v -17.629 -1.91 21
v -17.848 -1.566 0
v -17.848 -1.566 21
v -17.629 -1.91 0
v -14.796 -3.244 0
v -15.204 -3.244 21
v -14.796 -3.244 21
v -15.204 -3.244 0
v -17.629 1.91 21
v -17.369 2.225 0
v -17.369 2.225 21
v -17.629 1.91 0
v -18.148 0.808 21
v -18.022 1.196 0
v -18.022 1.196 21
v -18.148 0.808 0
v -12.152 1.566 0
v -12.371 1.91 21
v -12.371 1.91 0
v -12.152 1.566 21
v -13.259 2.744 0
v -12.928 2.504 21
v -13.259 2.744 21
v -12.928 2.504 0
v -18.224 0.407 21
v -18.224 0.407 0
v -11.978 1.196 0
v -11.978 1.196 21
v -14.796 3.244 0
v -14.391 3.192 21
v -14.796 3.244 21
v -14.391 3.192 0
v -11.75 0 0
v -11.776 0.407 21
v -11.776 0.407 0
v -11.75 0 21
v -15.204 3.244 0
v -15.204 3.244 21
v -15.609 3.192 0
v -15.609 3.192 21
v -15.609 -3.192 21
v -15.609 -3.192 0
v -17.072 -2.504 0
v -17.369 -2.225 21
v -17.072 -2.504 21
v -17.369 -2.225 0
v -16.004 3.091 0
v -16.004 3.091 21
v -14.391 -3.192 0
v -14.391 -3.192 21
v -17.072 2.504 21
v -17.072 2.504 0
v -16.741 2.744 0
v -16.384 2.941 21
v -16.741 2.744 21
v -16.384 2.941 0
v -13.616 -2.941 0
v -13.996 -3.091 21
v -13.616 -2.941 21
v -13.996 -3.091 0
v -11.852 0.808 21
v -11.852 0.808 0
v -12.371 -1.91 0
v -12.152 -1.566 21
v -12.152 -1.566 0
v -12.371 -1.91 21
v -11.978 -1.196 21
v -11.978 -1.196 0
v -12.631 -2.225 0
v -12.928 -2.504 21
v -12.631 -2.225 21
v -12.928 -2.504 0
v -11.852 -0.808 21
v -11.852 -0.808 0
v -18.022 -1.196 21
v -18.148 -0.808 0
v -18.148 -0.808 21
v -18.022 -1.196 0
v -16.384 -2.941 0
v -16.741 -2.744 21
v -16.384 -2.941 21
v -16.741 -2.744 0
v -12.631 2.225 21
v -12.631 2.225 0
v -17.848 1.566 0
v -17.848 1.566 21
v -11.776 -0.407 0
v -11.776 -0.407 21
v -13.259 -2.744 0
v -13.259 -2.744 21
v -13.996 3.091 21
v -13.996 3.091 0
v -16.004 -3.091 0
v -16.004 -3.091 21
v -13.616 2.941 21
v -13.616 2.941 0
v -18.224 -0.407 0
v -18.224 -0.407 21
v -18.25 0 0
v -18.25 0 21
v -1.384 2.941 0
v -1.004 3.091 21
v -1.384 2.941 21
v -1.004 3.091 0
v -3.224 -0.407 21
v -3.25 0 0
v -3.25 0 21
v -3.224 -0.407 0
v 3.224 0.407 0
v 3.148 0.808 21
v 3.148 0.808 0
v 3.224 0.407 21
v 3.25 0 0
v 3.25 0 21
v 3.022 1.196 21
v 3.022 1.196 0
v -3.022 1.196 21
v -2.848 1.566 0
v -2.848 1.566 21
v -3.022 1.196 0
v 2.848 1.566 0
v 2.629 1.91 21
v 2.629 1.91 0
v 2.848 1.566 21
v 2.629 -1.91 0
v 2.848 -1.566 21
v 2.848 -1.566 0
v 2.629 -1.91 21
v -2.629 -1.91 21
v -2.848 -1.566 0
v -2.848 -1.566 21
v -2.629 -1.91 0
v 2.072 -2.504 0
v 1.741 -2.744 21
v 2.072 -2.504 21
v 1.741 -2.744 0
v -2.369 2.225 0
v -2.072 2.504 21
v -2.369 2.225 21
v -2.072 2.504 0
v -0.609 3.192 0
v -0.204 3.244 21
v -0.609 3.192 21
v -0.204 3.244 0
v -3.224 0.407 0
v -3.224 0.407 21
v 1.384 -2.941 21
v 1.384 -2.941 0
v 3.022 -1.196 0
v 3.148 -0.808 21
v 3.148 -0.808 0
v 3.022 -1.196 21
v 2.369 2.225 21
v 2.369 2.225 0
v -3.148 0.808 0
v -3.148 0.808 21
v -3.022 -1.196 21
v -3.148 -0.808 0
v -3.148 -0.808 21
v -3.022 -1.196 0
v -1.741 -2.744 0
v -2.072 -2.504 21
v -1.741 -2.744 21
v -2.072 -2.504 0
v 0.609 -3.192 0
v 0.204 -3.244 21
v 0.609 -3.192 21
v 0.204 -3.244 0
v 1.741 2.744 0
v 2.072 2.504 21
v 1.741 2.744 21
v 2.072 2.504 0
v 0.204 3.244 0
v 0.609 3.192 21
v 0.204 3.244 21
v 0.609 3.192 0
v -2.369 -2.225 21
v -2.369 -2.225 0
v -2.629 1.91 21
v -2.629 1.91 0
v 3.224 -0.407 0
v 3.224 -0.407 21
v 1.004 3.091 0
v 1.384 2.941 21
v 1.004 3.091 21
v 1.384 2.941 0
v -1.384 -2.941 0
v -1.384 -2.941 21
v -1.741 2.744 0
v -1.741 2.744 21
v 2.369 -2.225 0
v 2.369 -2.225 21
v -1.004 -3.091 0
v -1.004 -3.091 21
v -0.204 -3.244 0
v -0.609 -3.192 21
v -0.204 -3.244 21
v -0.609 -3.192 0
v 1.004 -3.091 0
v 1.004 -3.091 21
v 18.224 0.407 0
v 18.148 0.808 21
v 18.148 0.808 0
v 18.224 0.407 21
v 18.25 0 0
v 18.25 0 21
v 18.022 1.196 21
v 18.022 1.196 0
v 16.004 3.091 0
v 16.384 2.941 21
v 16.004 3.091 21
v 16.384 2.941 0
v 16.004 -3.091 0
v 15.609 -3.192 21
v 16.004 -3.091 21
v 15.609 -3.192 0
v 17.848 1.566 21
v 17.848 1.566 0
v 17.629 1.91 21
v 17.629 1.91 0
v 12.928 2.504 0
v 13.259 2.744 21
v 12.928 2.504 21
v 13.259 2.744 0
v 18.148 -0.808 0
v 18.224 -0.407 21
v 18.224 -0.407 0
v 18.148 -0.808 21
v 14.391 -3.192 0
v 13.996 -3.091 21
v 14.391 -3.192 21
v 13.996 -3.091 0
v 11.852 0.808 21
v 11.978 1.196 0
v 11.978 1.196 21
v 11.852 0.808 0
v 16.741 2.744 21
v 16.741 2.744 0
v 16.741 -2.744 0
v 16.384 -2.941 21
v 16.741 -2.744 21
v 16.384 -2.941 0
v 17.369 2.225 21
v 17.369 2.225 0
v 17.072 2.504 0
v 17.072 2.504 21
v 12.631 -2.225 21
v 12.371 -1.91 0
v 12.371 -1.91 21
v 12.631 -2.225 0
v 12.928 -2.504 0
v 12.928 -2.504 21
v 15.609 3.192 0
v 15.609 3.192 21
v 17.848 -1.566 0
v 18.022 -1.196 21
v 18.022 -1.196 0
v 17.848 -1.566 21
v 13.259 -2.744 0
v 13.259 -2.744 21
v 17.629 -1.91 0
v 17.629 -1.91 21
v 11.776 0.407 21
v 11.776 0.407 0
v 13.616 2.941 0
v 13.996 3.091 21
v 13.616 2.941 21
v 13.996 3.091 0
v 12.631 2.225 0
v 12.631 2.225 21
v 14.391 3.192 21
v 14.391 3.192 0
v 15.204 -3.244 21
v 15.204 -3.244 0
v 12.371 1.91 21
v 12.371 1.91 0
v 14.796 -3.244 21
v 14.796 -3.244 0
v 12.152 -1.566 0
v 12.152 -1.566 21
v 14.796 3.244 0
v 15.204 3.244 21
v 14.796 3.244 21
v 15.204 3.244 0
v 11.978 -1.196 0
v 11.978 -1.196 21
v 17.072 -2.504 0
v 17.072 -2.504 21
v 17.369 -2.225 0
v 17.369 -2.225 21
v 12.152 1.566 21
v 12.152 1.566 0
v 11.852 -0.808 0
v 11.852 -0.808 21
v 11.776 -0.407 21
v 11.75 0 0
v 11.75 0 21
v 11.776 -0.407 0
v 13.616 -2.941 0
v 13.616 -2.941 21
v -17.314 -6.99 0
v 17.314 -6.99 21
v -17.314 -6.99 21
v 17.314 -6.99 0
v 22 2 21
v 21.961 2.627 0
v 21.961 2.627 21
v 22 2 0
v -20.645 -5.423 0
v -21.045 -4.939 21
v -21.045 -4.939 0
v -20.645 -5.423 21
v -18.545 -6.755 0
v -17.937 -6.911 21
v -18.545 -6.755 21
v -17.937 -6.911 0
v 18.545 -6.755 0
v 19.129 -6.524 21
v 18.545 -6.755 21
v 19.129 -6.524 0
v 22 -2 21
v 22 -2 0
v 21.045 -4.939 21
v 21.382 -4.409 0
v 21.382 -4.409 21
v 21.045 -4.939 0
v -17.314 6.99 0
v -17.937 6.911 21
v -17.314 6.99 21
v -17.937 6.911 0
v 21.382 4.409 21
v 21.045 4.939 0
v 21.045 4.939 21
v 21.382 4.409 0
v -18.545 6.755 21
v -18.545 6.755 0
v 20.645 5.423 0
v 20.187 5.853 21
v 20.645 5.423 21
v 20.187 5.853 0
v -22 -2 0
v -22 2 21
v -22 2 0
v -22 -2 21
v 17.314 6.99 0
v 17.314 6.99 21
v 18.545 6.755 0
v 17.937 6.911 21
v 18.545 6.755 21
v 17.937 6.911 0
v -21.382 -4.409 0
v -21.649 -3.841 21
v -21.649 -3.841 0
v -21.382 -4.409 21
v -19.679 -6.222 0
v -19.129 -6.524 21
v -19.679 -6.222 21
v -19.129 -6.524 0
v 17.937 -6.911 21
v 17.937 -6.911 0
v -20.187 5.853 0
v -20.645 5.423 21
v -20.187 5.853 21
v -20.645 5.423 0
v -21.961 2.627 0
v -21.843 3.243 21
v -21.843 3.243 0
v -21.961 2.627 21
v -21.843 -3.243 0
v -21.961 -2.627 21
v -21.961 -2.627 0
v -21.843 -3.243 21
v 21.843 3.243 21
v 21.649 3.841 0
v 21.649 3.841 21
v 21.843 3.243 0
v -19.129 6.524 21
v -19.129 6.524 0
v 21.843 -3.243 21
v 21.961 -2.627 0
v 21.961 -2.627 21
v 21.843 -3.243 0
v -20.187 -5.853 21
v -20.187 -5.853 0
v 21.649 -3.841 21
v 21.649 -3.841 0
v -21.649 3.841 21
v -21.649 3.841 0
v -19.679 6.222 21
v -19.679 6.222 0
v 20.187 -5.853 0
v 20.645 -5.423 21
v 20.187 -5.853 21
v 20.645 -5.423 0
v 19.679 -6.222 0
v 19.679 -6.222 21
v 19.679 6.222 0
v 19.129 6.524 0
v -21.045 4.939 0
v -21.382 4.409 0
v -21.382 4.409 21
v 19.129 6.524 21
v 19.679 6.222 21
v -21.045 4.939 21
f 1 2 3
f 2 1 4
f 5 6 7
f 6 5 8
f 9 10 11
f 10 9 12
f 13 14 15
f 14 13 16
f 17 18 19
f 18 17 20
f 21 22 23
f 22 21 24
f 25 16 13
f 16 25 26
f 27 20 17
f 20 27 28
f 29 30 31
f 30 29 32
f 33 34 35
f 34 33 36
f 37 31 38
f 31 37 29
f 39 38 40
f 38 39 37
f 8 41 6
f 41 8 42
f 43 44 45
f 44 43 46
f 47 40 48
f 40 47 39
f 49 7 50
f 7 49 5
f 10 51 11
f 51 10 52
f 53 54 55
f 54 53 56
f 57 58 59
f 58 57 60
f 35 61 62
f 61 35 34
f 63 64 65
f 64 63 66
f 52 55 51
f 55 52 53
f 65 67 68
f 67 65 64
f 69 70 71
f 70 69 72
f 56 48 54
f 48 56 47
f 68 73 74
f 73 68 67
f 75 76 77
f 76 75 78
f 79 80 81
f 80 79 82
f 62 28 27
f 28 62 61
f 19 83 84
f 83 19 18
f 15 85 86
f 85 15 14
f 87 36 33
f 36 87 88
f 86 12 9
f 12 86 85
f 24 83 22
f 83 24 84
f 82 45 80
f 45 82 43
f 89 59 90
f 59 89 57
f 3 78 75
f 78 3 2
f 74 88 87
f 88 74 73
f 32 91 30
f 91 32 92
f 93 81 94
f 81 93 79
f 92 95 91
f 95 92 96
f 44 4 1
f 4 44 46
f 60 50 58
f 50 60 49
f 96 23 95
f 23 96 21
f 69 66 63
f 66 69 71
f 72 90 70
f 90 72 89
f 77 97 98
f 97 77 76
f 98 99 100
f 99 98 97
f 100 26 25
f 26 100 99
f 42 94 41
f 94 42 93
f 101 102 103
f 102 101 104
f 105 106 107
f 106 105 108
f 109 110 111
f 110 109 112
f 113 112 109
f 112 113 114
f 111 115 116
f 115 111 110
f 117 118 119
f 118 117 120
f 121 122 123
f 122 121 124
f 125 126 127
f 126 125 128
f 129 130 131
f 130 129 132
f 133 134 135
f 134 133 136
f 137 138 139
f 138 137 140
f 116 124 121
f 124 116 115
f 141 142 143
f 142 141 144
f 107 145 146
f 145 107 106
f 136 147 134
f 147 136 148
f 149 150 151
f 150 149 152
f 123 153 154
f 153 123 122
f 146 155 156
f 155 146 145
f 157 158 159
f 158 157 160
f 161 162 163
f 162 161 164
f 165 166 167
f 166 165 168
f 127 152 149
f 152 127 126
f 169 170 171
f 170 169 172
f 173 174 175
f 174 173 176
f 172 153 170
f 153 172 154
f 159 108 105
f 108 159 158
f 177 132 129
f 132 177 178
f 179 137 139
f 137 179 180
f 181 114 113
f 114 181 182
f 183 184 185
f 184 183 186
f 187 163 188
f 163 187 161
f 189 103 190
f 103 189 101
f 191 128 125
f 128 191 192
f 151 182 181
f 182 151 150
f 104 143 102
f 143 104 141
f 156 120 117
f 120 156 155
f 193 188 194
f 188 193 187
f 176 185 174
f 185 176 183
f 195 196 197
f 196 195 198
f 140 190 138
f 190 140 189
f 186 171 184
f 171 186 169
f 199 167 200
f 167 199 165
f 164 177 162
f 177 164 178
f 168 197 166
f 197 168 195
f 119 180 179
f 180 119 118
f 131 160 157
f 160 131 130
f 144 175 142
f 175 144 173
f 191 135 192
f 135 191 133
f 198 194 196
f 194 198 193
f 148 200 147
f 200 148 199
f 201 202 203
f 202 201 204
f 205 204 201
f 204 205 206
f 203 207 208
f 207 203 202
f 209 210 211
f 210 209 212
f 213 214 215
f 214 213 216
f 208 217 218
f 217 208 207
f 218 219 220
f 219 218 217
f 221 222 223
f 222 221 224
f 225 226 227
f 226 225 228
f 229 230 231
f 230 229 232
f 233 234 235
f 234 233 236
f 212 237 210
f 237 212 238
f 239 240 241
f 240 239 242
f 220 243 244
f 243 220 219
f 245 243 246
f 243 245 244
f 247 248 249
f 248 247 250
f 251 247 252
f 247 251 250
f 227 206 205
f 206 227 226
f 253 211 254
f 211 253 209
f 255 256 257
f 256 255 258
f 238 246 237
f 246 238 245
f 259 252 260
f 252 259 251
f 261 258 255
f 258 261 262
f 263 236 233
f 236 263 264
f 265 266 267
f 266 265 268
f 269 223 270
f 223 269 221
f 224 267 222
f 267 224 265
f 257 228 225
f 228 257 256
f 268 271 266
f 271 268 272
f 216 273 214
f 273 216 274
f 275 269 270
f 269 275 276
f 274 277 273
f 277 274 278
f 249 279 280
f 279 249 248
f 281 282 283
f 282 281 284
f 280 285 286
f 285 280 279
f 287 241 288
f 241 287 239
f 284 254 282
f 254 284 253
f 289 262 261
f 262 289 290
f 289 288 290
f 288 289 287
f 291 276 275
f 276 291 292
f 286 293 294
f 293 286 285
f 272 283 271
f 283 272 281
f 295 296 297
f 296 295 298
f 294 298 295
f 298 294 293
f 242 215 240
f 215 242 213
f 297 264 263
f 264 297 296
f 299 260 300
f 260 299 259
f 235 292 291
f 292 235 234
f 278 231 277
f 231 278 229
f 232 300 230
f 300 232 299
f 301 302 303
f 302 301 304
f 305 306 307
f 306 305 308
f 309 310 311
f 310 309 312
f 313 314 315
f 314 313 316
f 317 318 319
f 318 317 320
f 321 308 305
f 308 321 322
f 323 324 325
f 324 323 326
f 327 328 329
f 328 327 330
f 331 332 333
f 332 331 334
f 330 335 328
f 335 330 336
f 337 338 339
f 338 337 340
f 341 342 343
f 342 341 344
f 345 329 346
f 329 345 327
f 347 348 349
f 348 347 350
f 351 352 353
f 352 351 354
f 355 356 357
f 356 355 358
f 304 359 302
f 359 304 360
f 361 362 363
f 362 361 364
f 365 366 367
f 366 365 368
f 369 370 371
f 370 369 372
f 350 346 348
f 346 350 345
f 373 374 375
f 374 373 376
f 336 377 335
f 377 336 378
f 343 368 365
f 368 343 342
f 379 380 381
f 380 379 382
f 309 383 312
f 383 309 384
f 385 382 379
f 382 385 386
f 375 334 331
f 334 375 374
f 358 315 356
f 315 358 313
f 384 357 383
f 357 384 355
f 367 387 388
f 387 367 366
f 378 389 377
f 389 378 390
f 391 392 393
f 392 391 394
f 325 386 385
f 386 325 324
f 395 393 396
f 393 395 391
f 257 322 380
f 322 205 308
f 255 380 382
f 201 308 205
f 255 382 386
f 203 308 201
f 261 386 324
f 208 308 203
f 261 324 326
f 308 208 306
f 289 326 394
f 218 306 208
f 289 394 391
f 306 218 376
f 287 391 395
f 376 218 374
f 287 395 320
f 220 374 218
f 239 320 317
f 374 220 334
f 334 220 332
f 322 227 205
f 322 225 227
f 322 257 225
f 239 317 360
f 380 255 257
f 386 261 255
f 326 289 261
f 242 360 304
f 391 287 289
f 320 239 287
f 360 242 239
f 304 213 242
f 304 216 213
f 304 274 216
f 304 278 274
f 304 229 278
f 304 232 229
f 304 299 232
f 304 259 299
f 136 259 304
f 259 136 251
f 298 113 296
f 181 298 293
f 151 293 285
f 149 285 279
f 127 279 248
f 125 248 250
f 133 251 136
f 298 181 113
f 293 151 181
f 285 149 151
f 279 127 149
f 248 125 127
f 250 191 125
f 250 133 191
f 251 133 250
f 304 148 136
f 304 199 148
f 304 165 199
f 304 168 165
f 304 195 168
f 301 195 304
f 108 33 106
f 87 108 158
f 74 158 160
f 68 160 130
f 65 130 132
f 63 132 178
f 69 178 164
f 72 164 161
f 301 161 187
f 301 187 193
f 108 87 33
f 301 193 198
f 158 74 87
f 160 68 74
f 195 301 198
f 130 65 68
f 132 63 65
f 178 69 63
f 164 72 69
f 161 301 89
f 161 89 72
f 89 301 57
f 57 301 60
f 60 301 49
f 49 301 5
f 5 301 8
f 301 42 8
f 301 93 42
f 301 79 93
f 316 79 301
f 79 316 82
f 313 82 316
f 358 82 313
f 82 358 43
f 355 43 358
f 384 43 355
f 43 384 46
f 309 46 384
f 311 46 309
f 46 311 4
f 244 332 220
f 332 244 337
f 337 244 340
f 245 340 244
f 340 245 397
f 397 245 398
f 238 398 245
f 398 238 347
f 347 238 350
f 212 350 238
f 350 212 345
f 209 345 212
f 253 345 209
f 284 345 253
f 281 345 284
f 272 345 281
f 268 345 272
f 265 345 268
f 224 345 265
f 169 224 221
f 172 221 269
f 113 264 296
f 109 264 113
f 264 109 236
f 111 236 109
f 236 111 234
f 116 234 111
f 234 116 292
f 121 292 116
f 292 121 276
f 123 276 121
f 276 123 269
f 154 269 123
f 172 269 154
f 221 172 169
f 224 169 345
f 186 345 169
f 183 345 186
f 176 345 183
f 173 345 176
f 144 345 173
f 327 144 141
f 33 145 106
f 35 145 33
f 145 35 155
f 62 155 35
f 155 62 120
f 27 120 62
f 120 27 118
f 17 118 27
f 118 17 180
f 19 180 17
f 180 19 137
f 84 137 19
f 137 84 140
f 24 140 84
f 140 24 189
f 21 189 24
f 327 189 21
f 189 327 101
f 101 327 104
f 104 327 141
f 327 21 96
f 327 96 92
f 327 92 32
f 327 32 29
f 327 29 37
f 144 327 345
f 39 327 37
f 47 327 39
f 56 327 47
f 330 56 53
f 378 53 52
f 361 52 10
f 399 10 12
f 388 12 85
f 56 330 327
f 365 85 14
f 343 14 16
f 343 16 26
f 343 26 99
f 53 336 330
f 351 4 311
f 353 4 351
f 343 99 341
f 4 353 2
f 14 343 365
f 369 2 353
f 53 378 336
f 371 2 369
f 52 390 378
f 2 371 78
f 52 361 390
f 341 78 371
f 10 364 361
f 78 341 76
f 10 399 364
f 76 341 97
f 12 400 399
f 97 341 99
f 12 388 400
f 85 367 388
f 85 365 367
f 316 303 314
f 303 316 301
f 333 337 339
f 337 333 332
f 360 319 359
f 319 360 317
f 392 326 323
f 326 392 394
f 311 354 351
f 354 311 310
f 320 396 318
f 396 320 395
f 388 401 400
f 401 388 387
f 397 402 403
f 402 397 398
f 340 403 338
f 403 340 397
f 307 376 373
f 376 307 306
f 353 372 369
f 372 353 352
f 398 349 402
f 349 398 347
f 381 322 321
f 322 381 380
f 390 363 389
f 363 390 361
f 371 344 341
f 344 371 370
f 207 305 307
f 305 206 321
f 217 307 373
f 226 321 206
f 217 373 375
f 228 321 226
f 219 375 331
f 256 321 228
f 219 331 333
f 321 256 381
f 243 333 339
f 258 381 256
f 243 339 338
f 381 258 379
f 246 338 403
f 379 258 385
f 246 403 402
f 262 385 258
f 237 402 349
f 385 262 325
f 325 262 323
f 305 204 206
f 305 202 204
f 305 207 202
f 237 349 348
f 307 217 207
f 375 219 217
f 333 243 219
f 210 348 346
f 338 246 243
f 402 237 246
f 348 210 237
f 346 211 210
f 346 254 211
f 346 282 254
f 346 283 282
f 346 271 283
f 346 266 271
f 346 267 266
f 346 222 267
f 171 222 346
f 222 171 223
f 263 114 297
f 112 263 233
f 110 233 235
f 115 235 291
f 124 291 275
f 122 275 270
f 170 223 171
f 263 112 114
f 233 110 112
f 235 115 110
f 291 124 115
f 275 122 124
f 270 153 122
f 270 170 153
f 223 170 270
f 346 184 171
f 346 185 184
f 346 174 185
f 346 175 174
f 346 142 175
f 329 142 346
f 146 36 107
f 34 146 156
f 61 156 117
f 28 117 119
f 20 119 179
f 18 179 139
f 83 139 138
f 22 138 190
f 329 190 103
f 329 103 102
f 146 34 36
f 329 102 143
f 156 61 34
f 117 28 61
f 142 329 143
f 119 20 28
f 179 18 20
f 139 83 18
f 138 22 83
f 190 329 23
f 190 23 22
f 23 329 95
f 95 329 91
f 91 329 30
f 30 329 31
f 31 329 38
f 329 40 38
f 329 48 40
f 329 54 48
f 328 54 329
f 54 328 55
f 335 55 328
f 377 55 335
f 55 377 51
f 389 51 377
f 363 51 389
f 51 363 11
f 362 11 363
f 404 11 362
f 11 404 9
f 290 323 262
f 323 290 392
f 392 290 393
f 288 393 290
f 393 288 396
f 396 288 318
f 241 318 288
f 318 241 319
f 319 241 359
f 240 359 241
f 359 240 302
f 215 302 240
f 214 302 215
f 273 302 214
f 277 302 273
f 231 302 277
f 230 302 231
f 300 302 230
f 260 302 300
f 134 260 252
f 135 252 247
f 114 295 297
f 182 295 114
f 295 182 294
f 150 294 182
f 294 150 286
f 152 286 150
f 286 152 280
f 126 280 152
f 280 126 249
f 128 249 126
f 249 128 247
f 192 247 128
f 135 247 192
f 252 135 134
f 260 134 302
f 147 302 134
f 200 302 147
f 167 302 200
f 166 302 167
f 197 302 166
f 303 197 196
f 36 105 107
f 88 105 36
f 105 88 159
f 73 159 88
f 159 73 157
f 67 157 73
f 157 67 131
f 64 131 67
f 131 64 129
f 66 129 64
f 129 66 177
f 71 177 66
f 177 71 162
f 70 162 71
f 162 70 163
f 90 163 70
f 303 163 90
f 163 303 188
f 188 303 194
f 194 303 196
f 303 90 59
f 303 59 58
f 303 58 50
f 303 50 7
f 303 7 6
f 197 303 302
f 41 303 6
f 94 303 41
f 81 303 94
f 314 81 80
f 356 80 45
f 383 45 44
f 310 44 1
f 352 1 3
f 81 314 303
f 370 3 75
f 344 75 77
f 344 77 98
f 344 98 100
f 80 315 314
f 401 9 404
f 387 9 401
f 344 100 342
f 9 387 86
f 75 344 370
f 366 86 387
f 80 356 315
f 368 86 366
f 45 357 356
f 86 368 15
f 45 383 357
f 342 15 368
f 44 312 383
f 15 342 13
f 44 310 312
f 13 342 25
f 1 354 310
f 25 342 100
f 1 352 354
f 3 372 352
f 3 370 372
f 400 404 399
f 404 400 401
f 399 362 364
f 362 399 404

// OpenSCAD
$fn = 50;


difference() {
	union() {
		hull() {
			translate(v = [-17.0000000000, 2.0000000000, 0]) {
				cylinder(h = 21, r = 5);
			}
			translate(v = [17.0000000000, 2.0000000000, 0]) {
				cylinder(h = 21, r = 5);
			}
			translate(v = [-17.0000000000, -2.0000000000, 0]) {
				cylinder(h = 21, r = 5);
			}
			translate(v = [17.0000000000, -2.0000000000, 0]) {
				cylinder(h = 21, r = 5);
			}
		}
	}
	union() {
		translate(v = [-15.0000000000, 0.0000000000, -100.0000000000]) {
			cylinder(h = 200, r = 3.2500000000);
		}
		translate(v = [0.0000000000, 0.0000000000, -100.0000000000]) {
			cylinder(h = 200, r = 3.2500000000);
		}
		translate(v = [15.0000000000, 0.0000000000, -100.0000000000]) {
			cylinder(h = 200, r = 3.2500000000);
		}
	}
}
